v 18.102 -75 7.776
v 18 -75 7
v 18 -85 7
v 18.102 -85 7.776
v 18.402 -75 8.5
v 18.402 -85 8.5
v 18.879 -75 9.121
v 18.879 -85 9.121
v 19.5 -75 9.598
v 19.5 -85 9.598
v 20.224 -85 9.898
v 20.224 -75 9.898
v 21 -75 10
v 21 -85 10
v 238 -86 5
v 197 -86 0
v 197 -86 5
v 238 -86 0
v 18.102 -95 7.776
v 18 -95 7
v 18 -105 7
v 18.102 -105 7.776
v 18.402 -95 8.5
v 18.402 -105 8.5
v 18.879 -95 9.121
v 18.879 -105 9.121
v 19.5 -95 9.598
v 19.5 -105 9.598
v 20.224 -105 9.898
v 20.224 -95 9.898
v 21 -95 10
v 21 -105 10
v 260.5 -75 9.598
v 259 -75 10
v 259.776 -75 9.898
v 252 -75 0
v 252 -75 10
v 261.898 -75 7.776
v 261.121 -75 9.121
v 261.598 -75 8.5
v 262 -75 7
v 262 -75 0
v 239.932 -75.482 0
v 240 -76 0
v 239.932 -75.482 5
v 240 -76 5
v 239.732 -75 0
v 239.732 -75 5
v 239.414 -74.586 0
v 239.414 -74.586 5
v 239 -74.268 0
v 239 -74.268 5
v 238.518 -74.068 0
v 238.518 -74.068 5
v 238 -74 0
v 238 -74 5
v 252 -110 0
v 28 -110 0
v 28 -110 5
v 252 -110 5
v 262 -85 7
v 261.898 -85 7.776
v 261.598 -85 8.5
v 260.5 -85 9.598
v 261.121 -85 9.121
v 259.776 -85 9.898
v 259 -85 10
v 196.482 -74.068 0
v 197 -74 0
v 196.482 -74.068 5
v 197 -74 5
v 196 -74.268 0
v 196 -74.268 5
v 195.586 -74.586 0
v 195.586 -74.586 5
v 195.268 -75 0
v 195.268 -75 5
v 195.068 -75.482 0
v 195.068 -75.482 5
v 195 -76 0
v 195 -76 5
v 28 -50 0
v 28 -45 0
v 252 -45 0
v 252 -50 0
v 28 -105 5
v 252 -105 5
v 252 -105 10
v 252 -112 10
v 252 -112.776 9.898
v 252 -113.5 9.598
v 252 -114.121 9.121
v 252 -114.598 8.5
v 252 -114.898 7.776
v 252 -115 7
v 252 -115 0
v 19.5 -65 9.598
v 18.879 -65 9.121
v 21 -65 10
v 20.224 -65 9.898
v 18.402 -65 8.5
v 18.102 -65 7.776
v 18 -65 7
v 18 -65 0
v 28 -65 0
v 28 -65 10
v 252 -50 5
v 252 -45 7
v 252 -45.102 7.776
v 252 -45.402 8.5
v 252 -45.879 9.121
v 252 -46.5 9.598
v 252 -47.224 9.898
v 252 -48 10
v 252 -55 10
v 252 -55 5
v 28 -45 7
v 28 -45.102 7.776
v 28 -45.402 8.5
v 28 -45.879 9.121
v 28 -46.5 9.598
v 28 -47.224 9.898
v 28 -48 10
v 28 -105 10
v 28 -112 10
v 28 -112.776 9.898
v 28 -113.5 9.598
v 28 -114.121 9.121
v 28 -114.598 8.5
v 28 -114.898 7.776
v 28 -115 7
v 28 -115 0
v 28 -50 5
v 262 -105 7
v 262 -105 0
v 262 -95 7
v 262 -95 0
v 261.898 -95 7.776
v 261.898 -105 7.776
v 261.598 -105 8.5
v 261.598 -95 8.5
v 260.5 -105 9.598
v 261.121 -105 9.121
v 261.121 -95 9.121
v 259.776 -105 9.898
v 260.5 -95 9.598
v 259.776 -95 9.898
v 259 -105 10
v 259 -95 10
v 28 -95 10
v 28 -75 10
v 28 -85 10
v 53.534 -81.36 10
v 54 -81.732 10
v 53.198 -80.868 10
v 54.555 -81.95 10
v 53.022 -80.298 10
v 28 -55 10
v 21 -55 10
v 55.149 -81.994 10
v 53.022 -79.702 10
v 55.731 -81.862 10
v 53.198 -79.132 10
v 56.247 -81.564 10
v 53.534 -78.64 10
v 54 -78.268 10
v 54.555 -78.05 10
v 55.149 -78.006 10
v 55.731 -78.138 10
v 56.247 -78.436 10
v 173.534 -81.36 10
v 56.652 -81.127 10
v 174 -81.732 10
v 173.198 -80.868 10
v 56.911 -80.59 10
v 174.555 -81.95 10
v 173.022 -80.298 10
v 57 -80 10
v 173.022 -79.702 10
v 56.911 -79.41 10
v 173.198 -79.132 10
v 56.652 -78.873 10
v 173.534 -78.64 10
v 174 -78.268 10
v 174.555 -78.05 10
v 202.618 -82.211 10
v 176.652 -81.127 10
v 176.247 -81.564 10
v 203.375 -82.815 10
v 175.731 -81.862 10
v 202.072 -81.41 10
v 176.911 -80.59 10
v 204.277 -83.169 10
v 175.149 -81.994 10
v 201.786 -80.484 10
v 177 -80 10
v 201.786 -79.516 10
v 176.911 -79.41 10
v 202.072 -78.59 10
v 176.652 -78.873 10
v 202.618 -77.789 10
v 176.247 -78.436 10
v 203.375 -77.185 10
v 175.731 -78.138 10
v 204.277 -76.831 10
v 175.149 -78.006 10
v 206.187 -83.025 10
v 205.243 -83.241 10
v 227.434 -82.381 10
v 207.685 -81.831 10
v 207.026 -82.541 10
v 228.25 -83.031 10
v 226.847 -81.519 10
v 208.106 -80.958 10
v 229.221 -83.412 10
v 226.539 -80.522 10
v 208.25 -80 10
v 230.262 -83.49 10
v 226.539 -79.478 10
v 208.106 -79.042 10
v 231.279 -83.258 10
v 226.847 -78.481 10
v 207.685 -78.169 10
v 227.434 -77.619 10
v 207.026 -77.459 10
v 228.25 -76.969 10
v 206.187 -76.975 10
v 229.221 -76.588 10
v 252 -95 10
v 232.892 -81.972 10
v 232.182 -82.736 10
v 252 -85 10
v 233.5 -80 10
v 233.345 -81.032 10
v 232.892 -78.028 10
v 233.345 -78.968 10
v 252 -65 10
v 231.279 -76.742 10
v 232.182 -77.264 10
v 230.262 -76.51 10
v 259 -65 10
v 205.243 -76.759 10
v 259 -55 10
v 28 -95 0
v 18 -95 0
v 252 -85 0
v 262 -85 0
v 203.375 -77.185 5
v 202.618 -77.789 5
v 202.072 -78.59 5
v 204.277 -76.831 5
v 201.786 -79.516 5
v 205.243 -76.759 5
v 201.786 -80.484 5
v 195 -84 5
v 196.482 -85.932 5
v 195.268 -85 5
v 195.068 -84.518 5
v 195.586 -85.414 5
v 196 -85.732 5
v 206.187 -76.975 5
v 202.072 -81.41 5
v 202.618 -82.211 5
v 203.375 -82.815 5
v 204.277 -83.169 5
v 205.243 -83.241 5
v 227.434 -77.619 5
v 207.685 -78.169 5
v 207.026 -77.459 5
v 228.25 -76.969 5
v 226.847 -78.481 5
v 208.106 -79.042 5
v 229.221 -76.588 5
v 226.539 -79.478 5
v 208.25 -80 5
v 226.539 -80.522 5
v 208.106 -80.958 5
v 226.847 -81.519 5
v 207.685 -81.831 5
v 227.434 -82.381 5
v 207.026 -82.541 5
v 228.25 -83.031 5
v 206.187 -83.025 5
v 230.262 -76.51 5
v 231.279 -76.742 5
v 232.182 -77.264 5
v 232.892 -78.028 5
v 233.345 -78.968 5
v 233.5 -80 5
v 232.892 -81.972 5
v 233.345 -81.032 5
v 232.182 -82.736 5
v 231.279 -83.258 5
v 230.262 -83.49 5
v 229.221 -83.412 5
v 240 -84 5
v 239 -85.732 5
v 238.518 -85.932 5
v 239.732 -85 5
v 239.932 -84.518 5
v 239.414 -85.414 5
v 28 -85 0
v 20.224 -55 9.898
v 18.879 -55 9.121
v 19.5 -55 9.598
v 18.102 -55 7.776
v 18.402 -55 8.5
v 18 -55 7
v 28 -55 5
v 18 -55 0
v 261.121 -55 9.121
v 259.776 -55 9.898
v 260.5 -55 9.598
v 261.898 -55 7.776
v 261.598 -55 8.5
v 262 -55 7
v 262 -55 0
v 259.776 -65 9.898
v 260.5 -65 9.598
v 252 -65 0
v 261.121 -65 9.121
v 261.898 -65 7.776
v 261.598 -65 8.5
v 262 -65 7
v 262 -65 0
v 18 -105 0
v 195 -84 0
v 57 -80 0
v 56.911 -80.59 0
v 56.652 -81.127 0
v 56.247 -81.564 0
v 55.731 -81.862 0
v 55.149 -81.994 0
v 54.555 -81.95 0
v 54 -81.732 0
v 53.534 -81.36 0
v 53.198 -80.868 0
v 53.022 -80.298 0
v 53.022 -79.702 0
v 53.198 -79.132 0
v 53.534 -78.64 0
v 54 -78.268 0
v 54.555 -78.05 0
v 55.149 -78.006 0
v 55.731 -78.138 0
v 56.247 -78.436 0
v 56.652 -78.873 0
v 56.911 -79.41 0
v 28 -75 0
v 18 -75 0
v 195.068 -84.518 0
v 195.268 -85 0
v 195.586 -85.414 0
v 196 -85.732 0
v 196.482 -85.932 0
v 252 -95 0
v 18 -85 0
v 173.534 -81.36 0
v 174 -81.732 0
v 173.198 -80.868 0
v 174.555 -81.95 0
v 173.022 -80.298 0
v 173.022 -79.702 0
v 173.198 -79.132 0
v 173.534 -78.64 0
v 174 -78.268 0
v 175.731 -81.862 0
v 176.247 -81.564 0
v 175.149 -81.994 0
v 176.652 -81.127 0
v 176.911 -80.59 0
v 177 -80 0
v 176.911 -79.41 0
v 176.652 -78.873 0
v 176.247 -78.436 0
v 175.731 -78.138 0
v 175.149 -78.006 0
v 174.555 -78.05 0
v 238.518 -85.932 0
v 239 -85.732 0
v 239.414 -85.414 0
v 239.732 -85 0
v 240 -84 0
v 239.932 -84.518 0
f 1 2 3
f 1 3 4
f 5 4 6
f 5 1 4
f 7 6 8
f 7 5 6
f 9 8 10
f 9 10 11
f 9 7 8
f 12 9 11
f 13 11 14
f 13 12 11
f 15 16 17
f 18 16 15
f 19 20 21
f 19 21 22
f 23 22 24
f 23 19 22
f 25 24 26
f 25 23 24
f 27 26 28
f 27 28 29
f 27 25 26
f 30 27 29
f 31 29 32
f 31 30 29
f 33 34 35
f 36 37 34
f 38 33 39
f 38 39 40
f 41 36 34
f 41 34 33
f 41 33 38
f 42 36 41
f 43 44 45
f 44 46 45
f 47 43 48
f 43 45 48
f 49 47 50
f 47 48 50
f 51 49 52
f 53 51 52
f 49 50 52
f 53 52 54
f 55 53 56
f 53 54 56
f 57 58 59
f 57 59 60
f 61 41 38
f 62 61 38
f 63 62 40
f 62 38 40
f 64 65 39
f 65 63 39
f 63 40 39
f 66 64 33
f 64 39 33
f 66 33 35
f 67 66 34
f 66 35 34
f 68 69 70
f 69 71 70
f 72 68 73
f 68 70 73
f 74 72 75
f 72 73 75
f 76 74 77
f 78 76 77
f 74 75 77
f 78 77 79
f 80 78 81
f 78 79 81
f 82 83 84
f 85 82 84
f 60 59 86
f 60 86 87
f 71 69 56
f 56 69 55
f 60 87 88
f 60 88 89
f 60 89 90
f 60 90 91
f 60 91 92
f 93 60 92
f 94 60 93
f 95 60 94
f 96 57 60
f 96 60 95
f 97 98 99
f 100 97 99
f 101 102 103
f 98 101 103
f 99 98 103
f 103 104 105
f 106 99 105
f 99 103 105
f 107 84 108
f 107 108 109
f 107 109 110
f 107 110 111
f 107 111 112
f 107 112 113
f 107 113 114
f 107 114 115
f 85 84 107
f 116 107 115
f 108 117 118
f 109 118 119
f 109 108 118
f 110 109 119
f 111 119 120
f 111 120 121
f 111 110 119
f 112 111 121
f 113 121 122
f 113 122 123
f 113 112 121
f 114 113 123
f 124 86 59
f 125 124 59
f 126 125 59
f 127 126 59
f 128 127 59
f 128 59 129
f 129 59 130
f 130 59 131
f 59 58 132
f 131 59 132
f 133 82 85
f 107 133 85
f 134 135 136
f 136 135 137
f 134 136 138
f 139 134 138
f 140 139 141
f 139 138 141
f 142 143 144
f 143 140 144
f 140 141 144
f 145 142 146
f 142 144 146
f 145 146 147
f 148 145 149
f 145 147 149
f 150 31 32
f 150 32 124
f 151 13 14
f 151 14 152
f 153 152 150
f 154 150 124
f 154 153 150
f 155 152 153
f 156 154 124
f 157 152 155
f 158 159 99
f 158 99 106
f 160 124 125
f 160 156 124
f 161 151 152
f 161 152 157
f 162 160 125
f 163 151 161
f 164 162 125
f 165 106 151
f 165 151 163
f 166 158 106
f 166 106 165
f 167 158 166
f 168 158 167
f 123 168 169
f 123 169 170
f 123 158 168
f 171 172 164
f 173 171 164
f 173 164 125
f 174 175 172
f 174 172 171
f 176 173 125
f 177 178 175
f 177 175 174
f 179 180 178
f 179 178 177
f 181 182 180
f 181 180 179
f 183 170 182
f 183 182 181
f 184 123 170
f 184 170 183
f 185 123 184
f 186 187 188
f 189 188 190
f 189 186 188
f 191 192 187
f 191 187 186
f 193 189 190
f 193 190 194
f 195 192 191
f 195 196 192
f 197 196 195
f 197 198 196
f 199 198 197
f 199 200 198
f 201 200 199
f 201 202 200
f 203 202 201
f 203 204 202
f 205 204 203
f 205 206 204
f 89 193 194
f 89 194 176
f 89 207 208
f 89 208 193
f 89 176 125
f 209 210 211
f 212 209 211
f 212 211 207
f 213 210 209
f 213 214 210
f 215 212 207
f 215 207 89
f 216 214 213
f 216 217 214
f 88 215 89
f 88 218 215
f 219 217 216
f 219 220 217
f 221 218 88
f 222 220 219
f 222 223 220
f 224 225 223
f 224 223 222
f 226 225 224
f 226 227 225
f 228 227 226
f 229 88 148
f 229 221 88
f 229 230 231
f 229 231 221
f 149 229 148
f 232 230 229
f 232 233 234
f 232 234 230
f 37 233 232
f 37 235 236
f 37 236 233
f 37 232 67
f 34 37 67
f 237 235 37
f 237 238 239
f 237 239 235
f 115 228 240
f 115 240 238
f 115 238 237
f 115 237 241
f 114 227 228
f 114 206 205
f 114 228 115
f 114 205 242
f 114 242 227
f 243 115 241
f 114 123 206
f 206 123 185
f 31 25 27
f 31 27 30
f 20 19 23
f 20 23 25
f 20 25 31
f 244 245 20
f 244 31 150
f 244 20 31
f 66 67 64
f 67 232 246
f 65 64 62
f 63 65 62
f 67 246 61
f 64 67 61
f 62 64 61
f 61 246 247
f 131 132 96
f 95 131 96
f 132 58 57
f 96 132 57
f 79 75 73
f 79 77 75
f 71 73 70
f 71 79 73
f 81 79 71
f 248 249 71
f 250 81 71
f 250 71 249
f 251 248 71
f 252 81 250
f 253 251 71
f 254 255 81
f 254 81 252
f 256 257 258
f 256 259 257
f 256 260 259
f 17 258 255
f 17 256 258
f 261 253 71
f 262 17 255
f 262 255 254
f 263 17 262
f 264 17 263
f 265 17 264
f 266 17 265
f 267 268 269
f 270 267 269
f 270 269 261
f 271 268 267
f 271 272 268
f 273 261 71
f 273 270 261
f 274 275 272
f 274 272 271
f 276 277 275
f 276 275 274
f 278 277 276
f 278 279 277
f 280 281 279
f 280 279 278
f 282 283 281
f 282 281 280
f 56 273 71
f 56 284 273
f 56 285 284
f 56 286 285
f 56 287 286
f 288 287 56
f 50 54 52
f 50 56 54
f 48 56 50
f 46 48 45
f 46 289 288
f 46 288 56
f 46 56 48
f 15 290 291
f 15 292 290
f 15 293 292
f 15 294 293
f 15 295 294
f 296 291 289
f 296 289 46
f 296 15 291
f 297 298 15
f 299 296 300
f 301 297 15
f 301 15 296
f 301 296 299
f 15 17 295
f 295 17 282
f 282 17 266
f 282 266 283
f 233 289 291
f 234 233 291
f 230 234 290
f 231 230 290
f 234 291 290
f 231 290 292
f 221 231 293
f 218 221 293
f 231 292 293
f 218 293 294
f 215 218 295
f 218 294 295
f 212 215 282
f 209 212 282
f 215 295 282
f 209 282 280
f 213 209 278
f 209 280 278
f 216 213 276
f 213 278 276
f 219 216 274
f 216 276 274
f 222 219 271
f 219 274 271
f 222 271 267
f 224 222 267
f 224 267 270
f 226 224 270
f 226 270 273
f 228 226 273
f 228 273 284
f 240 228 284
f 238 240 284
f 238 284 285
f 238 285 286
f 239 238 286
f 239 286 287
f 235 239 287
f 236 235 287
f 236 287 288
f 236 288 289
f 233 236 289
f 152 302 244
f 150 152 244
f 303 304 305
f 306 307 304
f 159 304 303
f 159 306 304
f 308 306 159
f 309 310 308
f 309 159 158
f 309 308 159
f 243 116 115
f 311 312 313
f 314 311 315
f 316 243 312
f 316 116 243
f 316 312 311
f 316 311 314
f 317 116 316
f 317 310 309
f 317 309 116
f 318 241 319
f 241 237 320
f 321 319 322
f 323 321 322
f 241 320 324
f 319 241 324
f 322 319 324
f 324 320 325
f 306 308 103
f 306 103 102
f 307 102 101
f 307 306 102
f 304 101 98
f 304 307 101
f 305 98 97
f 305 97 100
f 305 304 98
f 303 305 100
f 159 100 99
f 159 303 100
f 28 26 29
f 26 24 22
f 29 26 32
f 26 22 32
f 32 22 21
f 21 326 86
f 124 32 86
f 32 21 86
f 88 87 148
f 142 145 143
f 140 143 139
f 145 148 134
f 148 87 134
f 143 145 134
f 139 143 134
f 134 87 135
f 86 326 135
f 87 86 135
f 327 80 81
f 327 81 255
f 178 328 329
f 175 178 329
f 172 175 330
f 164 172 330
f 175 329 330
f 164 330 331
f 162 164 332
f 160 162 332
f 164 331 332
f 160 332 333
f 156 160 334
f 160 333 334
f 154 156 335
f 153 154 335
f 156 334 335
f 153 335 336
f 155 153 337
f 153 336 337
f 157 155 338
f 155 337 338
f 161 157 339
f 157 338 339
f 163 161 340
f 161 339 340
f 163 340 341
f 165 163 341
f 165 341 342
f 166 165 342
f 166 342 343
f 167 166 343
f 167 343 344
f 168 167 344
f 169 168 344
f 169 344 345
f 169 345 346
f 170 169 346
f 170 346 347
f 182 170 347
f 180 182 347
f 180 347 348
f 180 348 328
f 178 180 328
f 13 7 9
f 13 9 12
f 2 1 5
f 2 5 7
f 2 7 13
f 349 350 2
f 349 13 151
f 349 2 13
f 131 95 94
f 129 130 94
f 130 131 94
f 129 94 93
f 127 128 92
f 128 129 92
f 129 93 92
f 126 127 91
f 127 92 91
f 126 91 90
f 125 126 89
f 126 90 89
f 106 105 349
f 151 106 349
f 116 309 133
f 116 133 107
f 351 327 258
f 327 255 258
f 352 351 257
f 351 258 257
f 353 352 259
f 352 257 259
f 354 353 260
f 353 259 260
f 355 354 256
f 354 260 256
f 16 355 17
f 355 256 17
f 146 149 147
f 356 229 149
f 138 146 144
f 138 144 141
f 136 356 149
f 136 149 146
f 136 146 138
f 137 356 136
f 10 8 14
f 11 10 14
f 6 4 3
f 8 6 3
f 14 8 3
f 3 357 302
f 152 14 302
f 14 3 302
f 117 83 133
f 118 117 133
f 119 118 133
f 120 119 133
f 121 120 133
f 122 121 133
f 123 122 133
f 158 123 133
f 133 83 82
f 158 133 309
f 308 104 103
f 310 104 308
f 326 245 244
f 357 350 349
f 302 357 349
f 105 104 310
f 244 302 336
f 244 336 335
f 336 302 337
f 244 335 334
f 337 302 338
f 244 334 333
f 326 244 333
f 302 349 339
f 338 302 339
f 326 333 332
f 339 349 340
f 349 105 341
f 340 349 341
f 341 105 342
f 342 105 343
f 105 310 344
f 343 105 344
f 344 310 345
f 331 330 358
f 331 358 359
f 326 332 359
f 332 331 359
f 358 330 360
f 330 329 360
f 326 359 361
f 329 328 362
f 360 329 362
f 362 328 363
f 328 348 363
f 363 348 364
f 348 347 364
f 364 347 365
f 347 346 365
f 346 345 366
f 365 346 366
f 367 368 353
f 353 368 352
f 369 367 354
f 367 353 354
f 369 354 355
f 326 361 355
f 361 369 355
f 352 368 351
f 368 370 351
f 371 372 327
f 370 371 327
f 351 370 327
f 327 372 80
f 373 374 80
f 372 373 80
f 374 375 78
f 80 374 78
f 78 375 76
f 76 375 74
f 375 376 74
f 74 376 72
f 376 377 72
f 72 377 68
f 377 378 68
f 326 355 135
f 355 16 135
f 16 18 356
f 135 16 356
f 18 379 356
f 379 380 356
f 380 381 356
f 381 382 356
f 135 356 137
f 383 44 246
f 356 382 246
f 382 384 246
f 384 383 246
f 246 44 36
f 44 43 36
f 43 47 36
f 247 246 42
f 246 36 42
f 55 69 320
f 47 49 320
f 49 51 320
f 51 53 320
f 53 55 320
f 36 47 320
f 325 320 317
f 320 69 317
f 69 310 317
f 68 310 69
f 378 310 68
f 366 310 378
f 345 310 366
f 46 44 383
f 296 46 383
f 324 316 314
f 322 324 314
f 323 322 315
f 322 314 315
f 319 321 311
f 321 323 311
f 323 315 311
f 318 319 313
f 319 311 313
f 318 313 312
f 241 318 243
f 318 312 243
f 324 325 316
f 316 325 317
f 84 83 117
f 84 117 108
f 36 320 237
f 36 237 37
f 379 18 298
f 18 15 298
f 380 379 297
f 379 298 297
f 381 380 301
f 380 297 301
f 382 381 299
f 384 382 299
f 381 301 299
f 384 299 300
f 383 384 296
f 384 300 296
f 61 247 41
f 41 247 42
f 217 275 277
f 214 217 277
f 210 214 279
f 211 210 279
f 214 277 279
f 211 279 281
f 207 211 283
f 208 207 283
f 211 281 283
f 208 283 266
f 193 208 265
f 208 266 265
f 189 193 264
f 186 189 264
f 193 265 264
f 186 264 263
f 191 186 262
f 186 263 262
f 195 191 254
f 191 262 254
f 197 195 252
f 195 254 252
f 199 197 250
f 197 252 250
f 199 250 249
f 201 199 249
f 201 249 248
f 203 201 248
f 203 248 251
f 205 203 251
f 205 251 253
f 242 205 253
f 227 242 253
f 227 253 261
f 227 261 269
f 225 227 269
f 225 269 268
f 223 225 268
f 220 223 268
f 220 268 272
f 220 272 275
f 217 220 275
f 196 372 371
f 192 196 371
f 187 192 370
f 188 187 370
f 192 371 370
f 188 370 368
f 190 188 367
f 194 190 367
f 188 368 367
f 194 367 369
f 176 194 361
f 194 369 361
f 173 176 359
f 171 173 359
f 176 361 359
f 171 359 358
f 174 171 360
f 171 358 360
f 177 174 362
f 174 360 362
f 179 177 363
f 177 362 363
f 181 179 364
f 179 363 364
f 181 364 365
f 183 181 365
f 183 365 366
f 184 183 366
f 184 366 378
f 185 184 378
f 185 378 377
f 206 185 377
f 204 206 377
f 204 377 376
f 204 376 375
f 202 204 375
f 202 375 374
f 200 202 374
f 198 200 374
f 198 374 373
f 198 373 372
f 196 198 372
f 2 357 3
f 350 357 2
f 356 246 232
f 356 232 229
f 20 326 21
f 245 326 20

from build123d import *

# Parameters (mm, degrees)
SKETCH_W        = 244
SKETCH_H        = 70
PAD_DEPTH       = 10
FILLET_R        = 3
FILLET001_R     = 3
FILLET002_R     = 3
FILLET003_R     = 3
POCKET_DEPTH    = 5
SKETCH002_W     = 10
SKETCH002_H     = 10
POCKET001_DEPTH = 10.001
SKETCH003_R     = 3.5
SKETCH003_R_2   = 3.25
SKETCH003_R_3   = 2
POCKET002_DEPTH = 10.001
SKETCH004_W     = 45
SKETCH004_H     = 12
POCKET003_DEPTH = 5
FILLET004_R     = 2
FILLET005_R     = 2
FILLET006_R     = 2
FILLET007_R     = 2


with BuildPart() as part:
    # Sketch → Pad (new body)
    with BuildSketch(Plane.XY):
        Rectangle(SKETCH_W, SKETCH_H)
    extrude(amount=PAD_DEPTH)

    # Fillet
    fillet_edges = [part.edges().sort_by_distance(p)[0] for p in [
        (0, -35, 10),
    ]]
    fillet(fillet_edges, radius=FILLET_R)

    # Fillet001
    fillet001_edges = [part.edges().sort_by_distance(p)[0] for p in [
        (-122, 1.5, 10),
    ]]
    fillet(fillet001_edges, radius=FILLET001_R)

    # Fillet002
    fillet002_edges = [part.edges().sort_by_distance(p)[0] for p in [
        (1.5, 35, 10),
    ]]
    fillet(fillet002_edges, radius=FILLET002_R)

    # Fillet003
    fillet003_edges = [part.edges().sort_by_distance(p)[0] for p in [
        (122, 0, 10),
    ]]
    fillet(fillet003_edges, radius=FILLET003_R)

    # Sketch001 (on Face2 of Fillet003) → Pocket (cut)
    with BuildSketch(Plane(origin=(0, 0, 0), x_dir=(1, 0, 0), z_dir=(0, 0, -1))):
        with BuildLine():
            ThreePointArc((-117, 30), (-119.5, 27.5), (-117, 25))
            Line((-117, 25), (117, 25))
            ThreePointArc((117, 25), (119.5, 27.5), (117, 30))
            Line((-117, 30), (117, 30))
        make_face()
        with BuildLine():
            ThreePointArc((-117, -25), (-119.5, -27.5), (-117, -30))
            Line((-117, -30), (117, -30))
            ThreePointArc((117, -30), (119.5, -27.5), (117, -25))
            Line((-117, -25), (117, -25))
        make_face()
    extrude(amount=-POCKET_DEPTH, mode=Mode.SUBTRACT)

    # Sketch002 (on Face2 of Pocket) → Pocket001 (cut, through all)
    with BuildSketch(Plane(origin=(0, 0, 0), x_dir=(1, 0, 0), z_dir=(0, 0, -1))):
        with Locations((-117, 10)):
            Rectangle(SKETCH002_W, SKETCH002_H)
        with Locations((-117, 30)):
            Rectangle(SKETCH002_W, SKETCH002_H)
        with Locations((-117, -10)):
            Rectangle(SKETCH002_W, SKETCH002_H)
        with Locations((117, 10)):
            Rectangle(SKETCH002_W, SKETCH002_H)
        with Locations((117, 30)):
            Rectangle(SKETCH002_W, SKETCH002_H)
        with Locations((117, -10)):
            Rectangle(SKETCH002_W, SKETCH002_H)
        with Locations((-117, -30)):
            Rectangle(SKETCH002_W, SKETCH002_H)
        with Locations((117, -30)):
            Rectangle(SKETCH002_W, SKETCH002_H)
    extrude(amount=-POCKET001_DEPTH, mode=Mode.SUBTRACT)

    # Sketch003 (on Face2 of Pocket001) → Pocket002 (cut, through all)
    with BuildSketch(Plane(origin=(0, 0, 0), x_dir=(1, 0, 0), z_dir=(0, 0, -1))):
        with Locations((90, 0)):
            Circle(SKETCH003_R)
        with Locations((65, 0)):
            Circle(SKETCH003_R_2)
        with Locations((-85, 0)):
            Circle(SKETCH003_R_3)
        with Locations((35, 0)):
            Circle(SKETCH003_R_3)
    extrude(amount=-POCKET002_DEPTH, mode=Mode.SUBTRACT)

    # Sketch004 (on Face2 of Pocket002) → Pocket003 (cut)
    with BuildSketch(Plane(origin=(0, 0, 0), x_dir=(1, 0, 0), z_dir=(0, 0, -1))):
        with Locations((77.5, 0)):
            Rectangle(SKETCH004_W, SKETCH004_H)
    extrude(amount=-POCKET003_DEPTH, mode=Mode.SUBTRACT)

    # Fillet004
    fillet004_edges = [part.edges().sort_by_distance(p)[0] for p in [
        (100, 6, 2.5),
    ]]
    fillet(fillet004_edges, radius=FILLET004_R)

    # Fillet005
    fillet005_edges = [part.edges().sort_by_distance(p)[0] for p in [
        (55, 6, 2.5),
    ]]
    fillet(fillet005_edges, radius=FILLET005_R)

    # Fillet006
    fillet006_edges = [part.edges().sort_by_distance(p)[0] for p in [
        (55, -6, 2.5),
    ]]
    fillet(fillet006_edges, radius=FILLET006_R)

    # Fillet007
    fillet007_edges = [part.edges().sort_by_distance(p)[0] for p in [
        (100, -6, 2.5),
    ]]
    fillet(fillet007_edges, radius=FILLET007_R)


with BuildPart() as part_1:
    # Body placement: moved
    add(part.part.moved(Location((140, -80, 0))))


solid = part_1.part
